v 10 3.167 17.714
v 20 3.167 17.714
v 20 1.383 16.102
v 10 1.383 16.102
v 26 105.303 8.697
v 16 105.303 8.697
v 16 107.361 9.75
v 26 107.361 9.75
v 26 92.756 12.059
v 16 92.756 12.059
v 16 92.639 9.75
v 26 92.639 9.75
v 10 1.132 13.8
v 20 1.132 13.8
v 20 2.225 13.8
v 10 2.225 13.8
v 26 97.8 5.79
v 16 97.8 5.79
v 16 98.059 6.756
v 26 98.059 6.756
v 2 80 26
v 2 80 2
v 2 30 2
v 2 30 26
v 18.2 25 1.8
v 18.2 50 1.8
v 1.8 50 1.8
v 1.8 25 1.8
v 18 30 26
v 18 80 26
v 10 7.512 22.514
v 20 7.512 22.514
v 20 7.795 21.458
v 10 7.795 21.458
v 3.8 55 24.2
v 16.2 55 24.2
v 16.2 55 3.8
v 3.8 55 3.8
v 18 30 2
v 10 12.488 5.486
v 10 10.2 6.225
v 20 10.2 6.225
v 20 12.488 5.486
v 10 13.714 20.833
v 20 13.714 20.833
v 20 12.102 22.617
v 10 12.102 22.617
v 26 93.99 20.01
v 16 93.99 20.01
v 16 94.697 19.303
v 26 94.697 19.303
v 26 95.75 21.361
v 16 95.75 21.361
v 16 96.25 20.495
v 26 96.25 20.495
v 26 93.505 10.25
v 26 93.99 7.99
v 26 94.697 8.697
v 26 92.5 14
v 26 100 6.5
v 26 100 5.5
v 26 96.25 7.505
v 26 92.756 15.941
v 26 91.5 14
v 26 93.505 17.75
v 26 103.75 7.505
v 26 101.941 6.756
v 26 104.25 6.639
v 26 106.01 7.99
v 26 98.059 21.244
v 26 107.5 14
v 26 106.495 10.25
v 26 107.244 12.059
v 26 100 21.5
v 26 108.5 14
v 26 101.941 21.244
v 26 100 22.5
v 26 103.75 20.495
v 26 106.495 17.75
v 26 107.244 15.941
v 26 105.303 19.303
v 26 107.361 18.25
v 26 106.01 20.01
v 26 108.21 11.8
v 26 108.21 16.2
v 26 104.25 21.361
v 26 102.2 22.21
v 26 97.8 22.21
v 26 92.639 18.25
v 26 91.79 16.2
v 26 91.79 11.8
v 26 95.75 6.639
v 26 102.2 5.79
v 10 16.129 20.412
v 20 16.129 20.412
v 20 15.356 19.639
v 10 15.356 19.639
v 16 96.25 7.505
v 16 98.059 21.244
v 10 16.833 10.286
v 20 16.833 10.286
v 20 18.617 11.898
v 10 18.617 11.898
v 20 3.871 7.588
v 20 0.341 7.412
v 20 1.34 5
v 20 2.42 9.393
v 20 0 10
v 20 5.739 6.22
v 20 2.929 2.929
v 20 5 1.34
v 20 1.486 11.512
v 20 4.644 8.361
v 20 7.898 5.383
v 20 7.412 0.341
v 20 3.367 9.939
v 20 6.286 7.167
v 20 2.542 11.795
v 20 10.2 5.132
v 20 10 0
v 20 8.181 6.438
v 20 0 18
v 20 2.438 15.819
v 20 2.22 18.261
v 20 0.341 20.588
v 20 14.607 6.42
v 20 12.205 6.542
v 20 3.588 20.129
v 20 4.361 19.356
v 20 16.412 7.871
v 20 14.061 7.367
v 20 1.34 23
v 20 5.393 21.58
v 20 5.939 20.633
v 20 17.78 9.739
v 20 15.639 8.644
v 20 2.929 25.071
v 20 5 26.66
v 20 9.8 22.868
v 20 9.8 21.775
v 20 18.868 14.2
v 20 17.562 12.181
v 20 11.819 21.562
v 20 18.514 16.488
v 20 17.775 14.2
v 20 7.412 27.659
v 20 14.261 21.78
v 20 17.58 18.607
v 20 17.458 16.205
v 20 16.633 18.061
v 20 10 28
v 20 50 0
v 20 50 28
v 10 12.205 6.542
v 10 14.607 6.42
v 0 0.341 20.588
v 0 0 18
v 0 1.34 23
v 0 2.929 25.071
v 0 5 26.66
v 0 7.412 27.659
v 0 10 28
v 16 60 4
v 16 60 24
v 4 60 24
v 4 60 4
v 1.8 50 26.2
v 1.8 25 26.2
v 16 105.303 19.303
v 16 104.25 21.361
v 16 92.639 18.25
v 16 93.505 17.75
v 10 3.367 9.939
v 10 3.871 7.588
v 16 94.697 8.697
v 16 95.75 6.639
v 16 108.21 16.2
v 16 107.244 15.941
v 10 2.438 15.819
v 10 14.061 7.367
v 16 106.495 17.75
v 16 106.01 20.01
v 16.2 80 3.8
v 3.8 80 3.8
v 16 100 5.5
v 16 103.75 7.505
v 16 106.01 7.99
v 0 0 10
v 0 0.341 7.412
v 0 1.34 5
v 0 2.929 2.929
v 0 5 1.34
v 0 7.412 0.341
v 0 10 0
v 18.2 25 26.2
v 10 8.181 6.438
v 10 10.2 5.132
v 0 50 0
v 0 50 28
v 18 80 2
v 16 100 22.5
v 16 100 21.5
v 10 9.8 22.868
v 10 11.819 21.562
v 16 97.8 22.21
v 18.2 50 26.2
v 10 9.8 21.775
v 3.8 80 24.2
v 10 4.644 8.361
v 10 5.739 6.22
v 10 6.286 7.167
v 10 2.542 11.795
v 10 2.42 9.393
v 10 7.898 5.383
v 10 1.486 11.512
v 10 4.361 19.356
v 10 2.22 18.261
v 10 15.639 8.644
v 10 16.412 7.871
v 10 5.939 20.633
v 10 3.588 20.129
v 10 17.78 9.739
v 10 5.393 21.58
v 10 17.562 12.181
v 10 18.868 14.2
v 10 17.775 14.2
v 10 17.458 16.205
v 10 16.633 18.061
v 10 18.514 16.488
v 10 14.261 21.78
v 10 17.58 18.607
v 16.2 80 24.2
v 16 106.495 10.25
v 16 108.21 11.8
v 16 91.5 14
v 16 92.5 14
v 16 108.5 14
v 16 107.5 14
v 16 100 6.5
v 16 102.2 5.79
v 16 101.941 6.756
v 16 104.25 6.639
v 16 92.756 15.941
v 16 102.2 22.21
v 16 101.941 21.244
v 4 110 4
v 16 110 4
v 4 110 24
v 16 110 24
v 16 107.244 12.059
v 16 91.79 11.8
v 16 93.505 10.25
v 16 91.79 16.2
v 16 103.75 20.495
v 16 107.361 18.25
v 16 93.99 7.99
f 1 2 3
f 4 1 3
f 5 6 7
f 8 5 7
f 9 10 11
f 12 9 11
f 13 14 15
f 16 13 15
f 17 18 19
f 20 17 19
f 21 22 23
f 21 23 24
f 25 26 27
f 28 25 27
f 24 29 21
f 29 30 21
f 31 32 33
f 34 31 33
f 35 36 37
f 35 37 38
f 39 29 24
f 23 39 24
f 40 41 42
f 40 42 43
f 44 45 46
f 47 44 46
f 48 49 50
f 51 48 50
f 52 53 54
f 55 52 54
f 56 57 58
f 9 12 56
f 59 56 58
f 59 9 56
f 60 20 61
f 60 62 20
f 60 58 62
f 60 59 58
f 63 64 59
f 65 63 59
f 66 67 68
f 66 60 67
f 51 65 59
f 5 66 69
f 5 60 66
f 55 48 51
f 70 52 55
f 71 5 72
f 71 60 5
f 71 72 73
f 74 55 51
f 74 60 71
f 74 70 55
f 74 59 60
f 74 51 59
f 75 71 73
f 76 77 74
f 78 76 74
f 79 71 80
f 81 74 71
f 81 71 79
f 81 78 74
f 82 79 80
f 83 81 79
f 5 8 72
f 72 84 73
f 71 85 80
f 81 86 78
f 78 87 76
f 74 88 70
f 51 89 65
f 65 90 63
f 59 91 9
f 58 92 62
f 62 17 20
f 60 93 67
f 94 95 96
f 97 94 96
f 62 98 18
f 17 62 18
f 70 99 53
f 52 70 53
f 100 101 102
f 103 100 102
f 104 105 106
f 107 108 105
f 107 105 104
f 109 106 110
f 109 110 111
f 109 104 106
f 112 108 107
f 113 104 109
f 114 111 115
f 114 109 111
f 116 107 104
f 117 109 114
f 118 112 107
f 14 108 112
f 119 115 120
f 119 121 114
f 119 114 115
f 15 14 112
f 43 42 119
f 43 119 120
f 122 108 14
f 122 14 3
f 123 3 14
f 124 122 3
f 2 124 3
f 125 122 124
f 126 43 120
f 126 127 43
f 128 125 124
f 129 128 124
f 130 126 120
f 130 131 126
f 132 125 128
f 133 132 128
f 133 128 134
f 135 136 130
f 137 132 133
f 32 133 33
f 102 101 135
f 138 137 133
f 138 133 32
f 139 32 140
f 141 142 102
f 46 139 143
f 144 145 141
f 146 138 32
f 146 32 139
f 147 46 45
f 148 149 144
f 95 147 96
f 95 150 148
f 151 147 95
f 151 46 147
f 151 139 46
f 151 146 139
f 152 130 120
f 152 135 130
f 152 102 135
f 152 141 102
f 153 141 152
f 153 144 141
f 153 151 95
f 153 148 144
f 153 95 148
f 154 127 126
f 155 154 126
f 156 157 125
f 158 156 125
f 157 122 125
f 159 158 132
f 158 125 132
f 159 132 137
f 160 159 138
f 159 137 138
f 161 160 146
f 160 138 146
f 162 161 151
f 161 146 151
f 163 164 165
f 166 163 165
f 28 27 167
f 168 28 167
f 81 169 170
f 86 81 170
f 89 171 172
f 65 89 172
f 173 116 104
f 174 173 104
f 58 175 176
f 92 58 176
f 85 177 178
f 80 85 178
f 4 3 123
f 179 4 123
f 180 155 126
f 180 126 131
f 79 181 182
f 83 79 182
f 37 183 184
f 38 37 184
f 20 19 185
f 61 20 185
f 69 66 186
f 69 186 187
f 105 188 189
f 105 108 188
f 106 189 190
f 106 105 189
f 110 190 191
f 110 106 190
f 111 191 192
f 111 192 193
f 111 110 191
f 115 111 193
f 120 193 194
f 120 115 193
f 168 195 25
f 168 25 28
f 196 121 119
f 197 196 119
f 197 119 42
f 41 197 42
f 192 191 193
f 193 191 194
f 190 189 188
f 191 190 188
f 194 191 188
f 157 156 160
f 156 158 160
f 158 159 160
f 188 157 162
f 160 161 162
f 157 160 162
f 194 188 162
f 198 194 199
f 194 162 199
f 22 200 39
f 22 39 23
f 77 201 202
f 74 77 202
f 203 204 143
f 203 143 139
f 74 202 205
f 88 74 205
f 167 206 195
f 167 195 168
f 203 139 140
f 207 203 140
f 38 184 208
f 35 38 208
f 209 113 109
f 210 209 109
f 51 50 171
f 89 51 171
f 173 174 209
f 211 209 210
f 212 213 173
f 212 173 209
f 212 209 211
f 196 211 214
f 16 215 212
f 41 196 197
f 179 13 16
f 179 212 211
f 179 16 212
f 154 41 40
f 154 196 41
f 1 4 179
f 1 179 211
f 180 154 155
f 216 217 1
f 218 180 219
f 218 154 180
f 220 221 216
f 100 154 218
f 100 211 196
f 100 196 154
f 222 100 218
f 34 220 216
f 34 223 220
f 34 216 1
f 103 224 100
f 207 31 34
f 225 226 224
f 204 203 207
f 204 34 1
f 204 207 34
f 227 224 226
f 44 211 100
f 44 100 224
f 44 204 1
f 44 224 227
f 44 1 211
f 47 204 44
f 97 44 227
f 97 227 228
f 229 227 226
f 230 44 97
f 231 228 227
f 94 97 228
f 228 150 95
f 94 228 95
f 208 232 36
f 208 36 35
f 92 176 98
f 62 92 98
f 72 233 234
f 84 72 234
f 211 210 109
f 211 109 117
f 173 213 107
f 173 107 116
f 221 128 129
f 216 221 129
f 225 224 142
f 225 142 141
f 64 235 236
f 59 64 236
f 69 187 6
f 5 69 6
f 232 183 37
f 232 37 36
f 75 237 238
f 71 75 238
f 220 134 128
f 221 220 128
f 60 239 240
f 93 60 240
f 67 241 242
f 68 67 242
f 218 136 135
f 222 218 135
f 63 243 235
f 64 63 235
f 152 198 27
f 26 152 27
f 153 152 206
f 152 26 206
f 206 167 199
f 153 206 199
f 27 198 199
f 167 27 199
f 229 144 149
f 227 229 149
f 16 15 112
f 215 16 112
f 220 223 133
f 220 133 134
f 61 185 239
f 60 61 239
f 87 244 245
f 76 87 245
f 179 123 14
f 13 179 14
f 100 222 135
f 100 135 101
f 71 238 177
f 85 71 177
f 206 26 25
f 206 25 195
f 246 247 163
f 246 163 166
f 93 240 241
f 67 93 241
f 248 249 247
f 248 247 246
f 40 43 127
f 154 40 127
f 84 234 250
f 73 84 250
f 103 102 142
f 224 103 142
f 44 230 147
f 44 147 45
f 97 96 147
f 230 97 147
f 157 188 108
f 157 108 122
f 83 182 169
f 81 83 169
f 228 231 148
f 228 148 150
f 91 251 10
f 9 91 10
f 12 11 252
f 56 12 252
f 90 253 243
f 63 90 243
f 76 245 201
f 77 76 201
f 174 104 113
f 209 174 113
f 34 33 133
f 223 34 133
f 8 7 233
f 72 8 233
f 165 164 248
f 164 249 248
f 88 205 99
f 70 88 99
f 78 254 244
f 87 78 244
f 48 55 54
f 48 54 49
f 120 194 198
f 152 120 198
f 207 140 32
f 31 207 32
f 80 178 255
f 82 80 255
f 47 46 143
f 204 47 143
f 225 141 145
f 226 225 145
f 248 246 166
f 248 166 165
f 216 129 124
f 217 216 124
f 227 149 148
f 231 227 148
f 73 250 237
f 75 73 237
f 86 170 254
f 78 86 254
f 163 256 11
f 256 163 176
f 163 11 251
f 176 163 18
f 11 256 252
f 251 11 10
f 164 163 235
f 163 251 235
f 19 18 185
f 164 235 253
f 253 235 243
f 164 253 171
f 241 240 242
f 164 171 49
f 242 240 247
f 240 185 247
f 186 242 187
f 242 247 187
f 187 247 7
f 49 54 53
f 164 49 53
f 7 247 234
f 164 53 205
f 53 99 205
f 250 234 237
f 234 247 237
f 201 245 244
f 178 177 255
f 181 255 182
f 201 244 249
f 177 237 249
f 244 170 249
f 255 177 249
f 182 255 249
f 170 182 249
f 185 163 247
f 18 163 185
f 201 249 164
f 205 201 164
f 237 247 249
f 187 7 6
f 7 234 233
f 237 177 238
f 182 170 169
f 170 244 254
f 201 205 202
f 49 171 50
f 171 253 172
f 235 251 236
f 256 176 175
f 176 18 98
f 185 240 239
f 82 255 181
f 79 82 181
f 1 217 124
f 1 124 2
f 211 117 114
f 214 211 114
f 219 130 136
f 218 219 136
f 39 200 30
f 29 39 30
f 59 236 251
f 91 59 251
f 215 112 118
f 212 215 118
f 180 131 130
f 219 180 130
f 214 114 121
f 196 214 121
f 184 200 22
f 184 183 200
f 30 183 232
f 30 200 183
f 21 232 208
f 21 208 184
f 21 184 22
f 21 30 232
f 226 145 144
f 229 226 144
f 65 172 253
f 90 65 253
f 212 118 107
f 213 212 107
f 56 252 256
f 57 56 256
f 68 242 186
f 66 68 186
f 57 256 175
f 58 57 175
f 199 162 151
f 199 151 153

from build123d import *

# Parameters (mm, degrees)
F0_W           = 50
F0_H           = 28
F1_DEPTH       = 20
F3_DEPTH       = 10
F4_R           = 10
F5_W           = 16.4
F5_H           = 24.4
F5_W_2         = 16
F5_H_2         = 24
F6_DEPTH       = 25
F7_DEPTH       = 30
F7_DEPTH_BACK  = 20
F8_W           = 12.4
F8_H           = 20.4
F8_W_2         = 12
F8_H_2         = 20
F9_DEPTH       = 25
F10_DEPTH      = 30
F10_DEPTH_BACK = 20
F12_DEPTH      = 10


with BuildPart() as f1:
    # F0 (on Right) → F1 (new body)
    with BuildSketch(Plane.YZ):
        with Locations((25, 14)):
            Rectangle(F0_W, F0_H)
    extrude(amount=F1_DEPTH)

    # F2 (on face) → F3 (cut)
    with BuildSketch(Plane.YZ.offset(20)):
        Polygon((17.774749168, 14.2000007122), (18.513635743, 16.4882777954), (17.4580670209, 16.2054390088), (17.5795269568, 18.6069828589), (16.6331299314, 18.0605802816), (16.1288859342, 20.411729654), (15.3561559988, 19.6389997186), (14.2605714638, 21.779527669), (13.7141688864, 20.8331306436), (12.101906089, 22.6171637297), (11.8190673023, 21.5615950076), (9.7999992878, 22.8675543227), (9.7999992878, 21.774749168), (7.5117222046, 22.513635743), (7.7945609912, 21.4580670209), (5.3930171411, 21.5795269568), (5.9394197184, 20.6331299314), (3.588270346, 20.1288859342), (4.3610002814, 19.3561559988), (2.220472331, 18.2605714638), (3.1668693564, 17.7141688864), (1.3828362703, 16.101906089), (2.4384049924, 15.8190673023), (1.1324456773, 13.7999992878), (2.225250832, 13.7999992878), (1.486364257, 11.5117222046), (2.5419329791, 11.7945609912), (2.4204730432, 9.3930171411), (3.3668700686, 9.9394197184), (3.8711140658, 7.588270346), (4.6438440012, 8.3610002814), (5.7394285362, 6.220472331), (6.2858311136, 7.1668693564), (7.898093911, 5.3828362703), (8.1809326977, 6.4384049924), (10.2000007122, 5.1324456773), (10.2000007122, 6.225250832), (12.4882777954, 5.486364257), (12.2054390088, 6.5419329791), (14.6069828589, 6.4204730432), (14.0605802816, 7.3668700686), (16.411729654, 7.8711140658), (15.6389997186, 8.6438440012), (17.779527669, 9.7394285362), (16.8331306436, 10.2858311136), (18.6171637297, 11.898093911), (17.5615950076, 12.1809326977), (18.8675543227, 14.2000007122), align=None)
        Polygon((18.2103695235, 16.1999618834), (17.5, 14), (18.5, 14), (17.2444436972, 12.0588571617), (18.2103695235, 11.8000381166), (16.4951905284, 10.25), (17.3612159322, 9.75), (15.3033008589, 8.6966991411), (16.0104076401, 7.9895923599), (13.75, 7.5048094716), (14.25, 6.6387840678), (11.9411428383, 6.7555563028), (12.1999618834, 5.7896304765), (10, 6.5), (10, 5.5), (8.0588571617, 6.7555563028), (7.8000381166, 5.7896304765), (6.25, 7.5048094716), (5.75, 6.6387840678), (4.6966991411, 8.6966991411), (3.9895923599, 7.9895923599), (3.5048094716, 10.25), (2.6387840678, 9.75), (2.7555563028, 12.0588571617), (1.7896304765, 11.8000381166), (2.5, 14), (1.5, 14), (2.7555563028, 15.9411428383), (1.7896304765, 16.1999618834), (3.5048094716, 17.75), (2.6387840678, 18.25), (4.6966991411, 19.3033008589), (3.9895923599, 20.0104076401), (6.25, 20.4951905284), (5.75, 21.3612159322), (8.0588571617, 21.2444436972), (7.8000381166, 22.2103695235), (10, 21.5), (10, 22.5), (11.9411428383, 21.2444436972), (12.1999618834, 22.2103695235), (13.75, 20.4951905284), (14.25, 21.3612159322), (15.3033008589, 19.3033008589), (16.0104076401, 20.0104076401), (16.4951905284, 17.75), (17.3612159322, 18.25), (17.2444436972, 15.9411428383), align=None, mode=Mode.SUBTRACT)
        with BuildLine():
            ThreePointArc((17.2444436972, 12.0588571617), (17.4358364603, 13.0210535583), (17.5, 14))
            ThreePointArc((17.5, 14), (17.4358364603, 14.9789464417), (17.2444436972, 15.9411428383))
            ThreePointArc((17.2444436972, 15.9411428383), (16.9290964938, 16.8701257427), (16.4951905284, 17.75))
            ThreePointArc((16.4951905284, 17.75), (15.9501500522, 18.5657107176), (15.3033008589, 19.3033008589))
            ThreePointArc((15.3033008589, 19.3033008589), (14.5657107176, 19.9501500522), (13.75, 20.4951905284))
            ThreePointArc((13.75, 20.4951905284), (12.8701257427, 20.9290964938), (11.9411428383, 21.2444436972))
            ThreePointArc((11.9411428383, 21.2444436972), (10.9789464417, 21.4358364603), (10, 21.5))
            ThreePointArc((10, 21.5), (9.0210535583, 21.4358364603), (8.0588571617, 21.2444436972))
            ThreePointArc((8.0588571617, 21.2444436972), (7.1298742573, 20.9290964938), (6.25, 20.4951905284))
            ThreePointArc((6.25, 20.4951905284), (5.4342892824, 19.9501500522), (4.6966991411, 19.3033008589))
            ThreePointArc((4.6966991411, 19.3033008589), (4.0498499478, 18.5657107176), (3.5048094716, 17.75))
            ThreePointArc((3.5048094716, 17.75), (3.0709035062, 16.8701257427), (2.7555563028, 15.9411428383))
            ThreePointArc((2.7555563028, 15.9411428383), (2.5641635397, 14.9789464417), (2.5, 14))
            ThreePointArc((2.5, 14), (2.5641635397, 13.0210535583), (2.7555563028, 12.0588571617))
            ThreePointArc((2.7555563028, 12.0588571617), (3.0709035062, 11.1298742573), (3.5048094716, 10.25))
            ThreePointArc((3.5048094716, 10.25), (4.0498499478, 9.4342892824), (4.6966991411, 8.6966991411))
            ThreePointArc((4.6966991411, 8.6966991411), (5.4342892824, 8.0498499478), (6.25, 7.5048094716))
            ThreePointArc((6.25, 7.5048094716), (7.1298742573, 7.0709035062), (8.0588571617, 6.7555563028))
            ThreePointArc((8.0588571617, 6.7555563028), (9.0210535583, 6.5641635397), (10, 6.5))
            ThreePointArc((10, 6.5), (10.9789464417, 6.5641635397), (11.9411428383, 6.7555563028))
            ThreePointArc((11.9411428383, 6.7555563028), (12.8701257427, 7.0709035062), (13.75, 7.5048094716))
            ThreePointArc((13.75, 7.5048094716), (14.5657107176, 8.0498499478), (15.3033008589, 8.6966991411))
            ThreePointArc((15.3033008589, 8.6966991411), (15.9501500522, 9.4342892824), (16.4951905284, 10.25))
            ThreePointArc((16.4951905284, 10.25), (16.9290964938, 11.1298742573), (17.2444436972, 12.0588571617))
        make_face()
        with BuildLine():
            ThreePointArc((8.0588571617, 21.2444436972), (9.0210535583, 21.4358364603), (10, 21.5))
            Line((10, 21.5), (7.8000381166, 22.2103695235))
            Line((7.8000381166, 22.2103695235), (8.0588571617, 21.2444436972))
        make_face()
        with BuildLine():
            ThreePointArc((6.25, 20.4951905284), (7.1298742573, 20.9290964938), (8.0588571617, 21.2444436972))
            Line((8.0588571617, 21.2444436972), (5.75, 21.3612159322))
            Line((5.75, 21.3612159322), (6.25, 20.4951905284))
        make_face()
        with BuildLine():
            ThreePointArc((4.6966991411, 19.3033008589), (5.4342892824, 19.9501500522), (6.25, 20.4951905284))
            Line((6.25, 20.4951905284), (3.9895923599, 20.0104076401))
            Line((3.9895923599, 20.0104076401), (4.6966991411, 19.3033008589))
        make_face()
        with BuildLine():
            ThreePointArc((3.5048094716, 17.75), (4.0498499478, 18.5657107176), (4.6966991411, 19.3033008589))
            Line((4.6966991411, 19.3033008589), (2.6387840678, 18.25))
            Line((2.6387840678, 18.25), (3.5048094716, 17.75))
        make_face()
        with BuildLine():
            ThreePointArc((2.7555563028, 15.9411428383), (3.0709035062, 16.8701257427), (3.5048094716, 17.75))
            Line((3.5048094716, 17.75), (1.7896304765, 16.1999618834))
            Line((1.7896304765, 16.1999618834), (2.7555563028, 15.9411428383))
        make_face()
        with BuildLine():
            Line((1.7896304765, 11.8000381166), (2.7555563028, 12.0588571617))
            ThreePointArc((2.7555563028, 12.0588571617), (2.5641635397, 13.0210535583), (2.5, 14))
            Line((2.5, 14), (1.7896304765, 11.8000381166))
        make_face()
        with BuildLine():
            ThreePointArc((2.5, 14), (2.5641635397, 14.9789464417), (2.7555563028, 15.9411428383))
            Line((2.7555563028, 15.9411428383), (1.5, 14))
            Line((1.5, 14), (2.5, 14))
        make_face()
        with BuildLine():
            Line((2.6387840678, 9.75), (3.5048094716, 10.25))
            ThreePointArc((3.5048094716, 10.25), (3.0709035062, 11.1298742573), (2.7555563028, 12.0588571617))
            Line((2.7555563028, 12.0588571617), (2.6387840678, 9.75))
        make_face()
        with BuildLine():
            ThreePointArc((10, 21.5), (10.9789464417, 21.4358364603), (11.9411428383, 21.2444436972))
            Line((11.9411428383, 21.2444436972), (10, 22.5))
            Line((10, 22.5), (10, 21.5))
        make_face()
        with BuildLine():
            ThreePointArc((11.9411428383, 21.2444436972), (12.8701257427, 20.9290964938), (13.75, 20.4951905284))
            Line((13.75, 20.4951905284), (12.1999618834, 22.2103695235))
            Line((12.1999618834, 22.2103695235), (11.9411428383, 21.2444436972))
        make_face()
        with BuildLine():
            ThreePointArc((13.75, 20.4951905284), (14.5657107176, 19.9501500522), (15.3033008589, 19.3033008589))
            Line((15.3033008589, 19.3033008589), (14.25, 21.3612159322))
            Line((14.25, 21.3612159322), (13.75, 20.4951905284))
        make_face()
        with BuildLine():
            ThreePointArc((15.3033008589, 19.3033008589), (15.9501500522, 18.5657107176), (16.4951905284, 17.75))
            Line((16.4951905284, 17.75), (16.0104076401, 20.0104076401))
            Line((16.0104076401, 20.0104076401), (15.3033008589, 19.3033008589))
        make_face()
        with BuildLine():
            ThreePointArc((16.4951905284, 17.75), (16.9290964938, 16.8701257427), (17.2444436972, 15.9411428383))
            Line((17.2444436972, 15.9411428383), (17.3612159322, 18.25))
            Line((17.3612159322, 18.25), (16.4951905284, 17.75))
        make_face()
        with BuildLine():
            ThreePointArc((17.2444436972, 15.9411428383), (17.4358364603, 14.9789464417), (17.5, 14))
            Line((17.5, 14), (18.2103695235, 16.1999618834))
            Line((18.2103695235, 16.1999618834), (17.2444436972, 15.9411428383))
        make_face()
        with BuildLine():
            Line((18.5, 14), (17.5, 14))
            ThreePointArc((17.5, 14), (17.4358364603, 13.0210535583), (17.2444436972, 12.0588571617))
            Line((17.2444436972, 12.0588571617), (18.5, 14))
        make_face()
        with BuildLine():
            Line((18.2103695235, 11.8000381166), (17.2444436972, 12.0588571617))
            ThreePointArc((17.2444436972, 12.0588571617), (16.9290964938, 11.1298742573), (16.4951905284, 10.25))
            Line((16.4951905284, 10.25), (18.2103695235, 11.8000381166))
        make_face()
        with BuildLine():
            Line((17.3612159322, 9.75), (16.4951905284, 10.25))
            ThreePointArc((16.4951905284, 10.25), (15.9501500522, 9.4342892824), (15.3033008589, 8.6966991411))
            Line((15.3033008589, 8.6966991411), (17.3612159322, 9.75))
        make_face()
        with BuildLine():
            Line((16.0104076401, 7.9895923599), (15.3033008589, 8.6966991411))
            ThreePointArc((15.3033008589, 8.6966991411), (14.5657107176, 8.0498499478), (13.75, 7.5048094716))
            Line((13.75, 7.5048094716), (16.0104076401, 7.9895923599))
        make_face()
        with BuildLine():
            Line((14.25, 6.6387840678), (13.75, 7.5048094716))
            ThreePointArc((13.75, 7.5048094716), (12.8701257427, 7.0709035062), (11.9411428383, 6.7555563028))
            Line((11.9411428383, 6.7555563028), (14.25, 6.6387840678))
        make_face()
        with BuildLine():
            Line((12.1999618834, 5.7896304765), (11.9411428383, 6.7555563028))
            ThreePointArc((11.9411428383, 6.7555563028), (10.9789464417, 6.5641635397), (10, 6.5))
            Line((10, 6.5), (12.1999618834, 5.7896304765))
        make_face()
        with BuildLine():
            Line((10, 5.5), (10, 6.5))
            ThreePointArc((10, 6.5), (9.0210535583, 6.5641635397), (8.0588571617, 6.7555563028))
            Line((8.0588571617, 6.7555563028), (10, 5.5))
        make_face()
        with BuildLine():
            Line((7.8000381166, 5.7896304765), (8.0588571617, 6.7555563028))
            ThreePointArc((8.0588571617, 6.7555563028), (7.1298742573, 7.0709035062), (6.25, 7.5048094716))
            Line((6.25, 7.5048094716), (7.8000381166, 5.7896304765))
        make_face()
        with BuildLine():
            Line((5.75, 6.6387840678), (6.25, 7.5048094716))
            ThreePointArc((6.25, 7.5048094716), (5.4342892824, 8.0498499478), (4.6966991411, 8.6966991411))
            Line((4.6966991411, 8.6966991411), (5.75, 6.6387840678))
        make_face()
        with BuildLine():
            Line((3.9895923599, 7.9895923599), (4.6966991411, 8.6966991411))
            ThreePointArc((4.6966991411, 8.6966991411), (4.0498499478, 9.4342892824), (3.5048094716, 10.25))
            Line((3.5048094716, 10.25), (3.9895923599, 7.9895923599))
        make_face()
    extrude(amount=-F3_DEPTH, mode=Mode.SUBTRACT)

    # F4
    f4_edges = [f1.edges().sort_by_distance(p)[0] for p in [
        (10, 0, 0),
        (10, 0, 28),
    ]]
    fillet(f4_edges, radius=F4_R)

    # F5 (on face) → F6 (cut)
    with BuildSketch(Plane(origin=(0, 50, 0), x_dir=(-1, 0, 0), z_dir=(0, 1, 0))):
        with Locations((-10, 14)):
            Rectangle(F5_W, F5_H)
        with Locations((-10, 14)):
            Rectangle(F5_W_2, F5_H_2, mode=Mode.SUBTRACT)
        with Locations((-10, 14)):
            Rectangle(F5_W_2, F5_H_2)
    extrude(amount=-F6_DEPTH, mode=Mode.SUBTRACT)


with BuildPart() as f7:
    # F5 (on face) → F7 (new body, two sides)
    with BuildSketch(Plane(origin=(0, 50, 0), x_dir=(-1, 0, 0), z_dir=(0, 1, 0))) as f7_sk:
        with Locations((-10, 14)):
            Rectangle(F5_W_2, F5_H_2)
    extrude(amount=F7_DEPTH)
    extrude(f7_sk.sketch, amount=-F7_DEPTH_BACK)

    # F8 (on face) → F9 (cut)
    with BuildSketch(Plane(origin=(0, 80, 0), x_dir=(-1, 0, 0), z_dir=(0, 1, 0))):
        with Locations((-10, 14)):
            Rectangle(F8_W, F8_H)
        with Locations((-10, 14)):
            Rectangle(F8_W_2, F8_H_2, mode=Mode.SUBTRACT)
        with Locations((-10, 14)):
            Rectangle(F8_W_2, F8_H_2)
    extrude(amount=-F9_DEPTH, mode=Mode.SUBTRACT)


with BuildPart() as f10:
    # F8 (on face) → F10 (new body, two sides)
    with BuildSketch(Plane(origin=(0, 80, 0), x_dir=(-1, 0, 0), z_dir=(0, 1, 0))) as f10_sk:
        with Locations((-10, 14)):
            Rectangle(F8_W_2, F8_H_2)
    extrude(amount=F10_DEPTH)
    extrude(f10_sk.sketch, amount=-F10_DEPTH_BACK)

    # F11 (on face) → F12 (join)
    with BuildSketch(Plane.YZ.offset(16)):
        with BuildLine():
            ThreePointArc((107.2444436972, 12.0588571617), (107.4358364603, 13.0210535583), (107.5, 14))
            ThreePointArc((107.5, 14), (107.4358364603, 14.9789464417), (107.2444436972, 15.9411428383))
            ThreePointArc((107.2444436972, 15.9411428383), (106.9290964938, 16.8701257427), (106.4951905284, 17.75))
            ThreePointArc((106.4951905284, 17.75), (105.9501500522, 18.5657107176), (105.3033008589, 19.3033008589))
            ThreePointArc((105.3033008589, 19.3033008589), (104.5657107176, 19.9501500522), (103.75, 20.4951905284))
            ThreePointArc((103.75, 20.4951905284), (102.8701257427, 20.9290964938), (101.9411428383, 21.2444436972))
            ThreePointArc((101.9411428383, 21.2444436972), (100.9789464417, 21.4358364603), (100, 21.5))
            ThreePointArc((100, 21.5), (99.0210535583, 21.4358364603), (98.0588571617, 21.2444436972))
            ThreePointArc((98.0588571617, 21.2444436972), (97.1298742573, 20.9290964938), (96.25, 20.4951905284))
            ThreePointArc((96.25, 20.4951905284), (95.4342892824, 19.9501500522), (94.6966991411, 19.3033008589))
            ThreePointArc((94.6966991411, 19.3033008589), (94.0498499478, 18.5657107176), (93.5048094716, 17.75))
            ThreePointArc((93.5048094716, 17.75), (93.0709035062, 16.8701257427), (92.7555563028, 15.9411428383))
            ThreePointArc((92.7555563028, 15.9411428383), (92.5641635397, 14.9789464417), (92.5, 14))
            ThreePointArc((92.5, 14), (92.5641635397, 13.0210535583), (92.7555563028, 12.0588571617))
            ThreePointArc((92.7555563028, 12.0588571617), (93.0709035062, 11.1298742573), (93.5048094716, 10.25))
            ThreePointArc((93.5048094716, 10.25), (94.0498499478, 9.4342892824), (94.6966991411, 8.6966991411))
            ThreePointArc((94.6966991411, 8.6966991411), (95.4342892824, 8.0498499478), (96.25, 7.5048094716))
            ThreePointArc((96.25, 7.5048094716), (97.1298742573, 7.0709035062), (98.0588571617, 6.7555563028))
            ThreePointArc((98.0588571617, 6.7555563028), (99.0210535583, 6.5641635397), (100, 6.5))
            ThreePointArc((100, 6.5), (100.9789464417, 6.5641635397), (101.9411428383, 6.7555563028))
            ThreePointArc((101.9411428383, 6.7555563028), (102.8701257427, 7.0709035062), (103.75, 7.5048094716))
            ThreePointArc((103.75, 7.5048094716), (104.5657107176, 8.0498499478), (105.3033008589, 8.6966991411))
            ThreePointArc((105.3033008589, 8.6966991411), (105.9501500522, 9.4342892824), (106.4951905284, 10.25))
            ThreePointArc((106.4951905284, 10.25), (106.9290964938, 11.1298742573), (107.2444436972, 12.0588571617))
        make_face()
        with BuildLine():
            Line((108.2103695235, 11.8000381166), (107.2444436972, 12.0588571617))
            ThreePointArc((107.2444436972, 12.0588571617), (106.9290964938, 11.1298742573), (106.4951905284, 10.25))
            Line((106.4951905284, 10.25), (108.2103695235, 11.8000381166))
        make_face()
        with BuildLine():
            Line((108.5, 14), (107.5, 14))
            ThreePointArc((107.5, 14), (107.4358364603, 13.0210535583), (107.2444436972, 12.0588571617))
            Line((107.2444436972, 12.0588571617), (108.5, 14))
        make_face()
        with BuildLine():
            ThreePointArc((107.2444436972, 15.9411428383), (107.4358364603, 14.9789464417), (107.5, 14))
            Line((107.5, 14), (108.2103695235, 16.1999618834))
            Line((108.2103695235, 16.1999618834), (107.2444436972, 15.9411428383))
        make_face()
        with BuildLine():
            ThreePointArc((106.4951905284, 17.75), (106.9290964938, 16.8701257427), (107.2444436972, 15.9411428383))
            Line((107.2444436972, 15.9411428383), (107.3612159322, 18.25))
            Line((107.3612159322, 18.25), (106.4951905284, 17.75))
        make_face()
        with BuildLine():
            ThreePointArc((105.3033008589, 19.3033008589), (105.9501500522, 18.5657107176), (106.4951905284, 17.75))
            Line((106.4951905284, 17.75), (106.0104076401, 20.0104076401))
            Line((106.0104076401, 20.0104076401), (105.3033008589, 19.3033008589))
        make_face()
        with BuildLine():
            ThreePointArc((103.75, 20.4951905284), (104.5657107176, 19.9501500522), (105.3033008589, 19.3033008589))
            Line((105.3033008589, 19.3033008589), (104.25, 21.3612159322))
            Line((104.25, 21.3612159322), (103.75, 20.4951905284))
        make_face()
        with BuildLine():
            ThreePointArc((101.9411428383, 21.2444436972), (102.8701257427, 20.9290964938), (103.75, 20.4951905284))
            Line((103.75, 20.4951905284), (102.1999618834, 22.2103695235))
            Line((102.1999618834, 22.2103695235), (101.9411428383, 21.2444436972))
        make_face()
        with BuildLine():
            ThreePointArc((100, 21.5), (100.9789464417, 21.4358364603), (101.9411428383, 21.2444436972))
            Line((101.9411428383, 21.2444436972), (100, 22.5))
            Line((100, 22.5), (100, 21.5))
        make_face()
        with BuildLine():
            ThreePointArc((98.0588571617, 21.2444436972), (99.0210535583, 21.4358364603), (100, 21.5))
            Line((100, 21.5), (97.8000381166, 22.2103695235))
            Line((97.8000381166, 22.2103695235), (98.0588571617, 21.2444436972))
        make_face()
        with BuildLine():
            ThreePointArc((96.25, 20.4951905284), (97.1298742573, 20.9290964938), (98.0588571617, 21.2444436972))
            Line((98.0588571617, 21.2444436972), (95.75, 21.3612159322))
            Line((95.75, 21.3612159322), (96.25, 20.4951905284))
        make_face()
        with BuildLine():
            ThreePointArc((94.6966991411, 19.3033008589), (95.4342892824, 19.9501500522), (96.25, 20.4951905284))
            Line((96.25, 20.4951905284), (93.9895923599, 20.0104076401))
            Line((93.9895923599, 20.0104076401), (94.6966991411, 19.3033008589))
        make_face()
        with BuildLine():
            ThreePointArc((93.5048094716, 17.75), (94.0498499478, 18.5657107176), (94.6966991411, 19.3033008589))
            Line((94.6966991411, 19.3033008589), (92.6387840678, 18.25))
            Line((92.6387840678, 18.25), (93.5048094716, 17.75))
        make_face()
        with BuildLine():
            ThreePointArc((92.7555563028, 15.9411428383), (93.0709035062, 16.8701257427), (93.5048094716, 17.75))
            Line((93.5048094716, 17.75), (91.7896304765, 16.1999618834))
            Line((91.7896304765, 16.1999618834), (92.7555563028, 15.9411428383))
        make_face()
        with BuildLine():
            ThreePointArc((92.5, 14), (92.5641635397, 14.9789464417), (92.7555563028, 15.9411428383))
            Line((92.7555563028, 15.9411428383), (91.5, 14))
            Line((91.5, 14), (92.5, 14))
        make_face()
        with BuildLine():
            Line((91.7896304765, 11.8000381166), (92.7555563028, 12.0588571617))
            ThreePointArc((92.7555563028, 12.0588571617), (92.5641635397, 13.0210535583), (92.5, 14))
            Line((92.5, 14), (91.7896304765, 11.8000381166))
        make_face()
        with BuildLine():
            Line((92.6387840678, 9.75), (93.5048094716, 10.25))
            ThreePointArc((93.5048094716, 10.25), (93.0709035062, 11.1298742573), (92.7555563028, 12.0588571617))
            Line((92.7555563028, 12.0588571617), (92.6387840678, 9.75))
        make_face()
        with BuildLine():
            Line((93.9895923599, 7.9895923599), (94.6966991411, 8.6966991411))
            ThreePointArc((94.6966991411, 8.6966991411), (94.0498499478, 9.4342892824), (93.5048094716, 10.25))
            Line((93.5048094716, 10.25), (93.9895923599, 7.9895923599))
        make_face()
        with BuildLine():
            Line((95.75, 6.6387840678), (96.25, 7.5048094716))
            ThreePointArc((96.25, 7.5048094716), (95.4342892824, 8.0498499478), (94.6966991411, 8.6966991411))
            Line((94.6966991411, 8.6966991411), (95.75, 6.6387840678))
        make_face()
        with BuildLine():
            Line((97.8000381166, 5.7896304765), (98.0588571617, 6.7555563028))
            ThreePointArc((98.0588571617, 6.7555563028), (97.1298742573, 7.0709035062), (96.25, 7.5048094716))
            Line((96.25, 7.5048094716), (97.8000381166, 5.7896304765))
        make_face()
        with BuildLine():
            Line((100, 5.5), (100, 6.5))
            ThreePointArc((100, 6.5), (99.0210535583, 6.5641635397), (98.0588571617, 6.7555563028))
            Line((98.0588571617, 6.7555563028), (100, 5.5))
        make_face()
        with BuildLine():
            Line((107.3612159322, 9.75), (106.4951905284, 10.25))
            ThreePointArc((106.4951905284, 10.25), (105.9501500522, 9.4342892824), (105.3033008589, 8.6966991411))
            Line((105.3033008589, 8.6966991411), (107.3612159322, 9.75))
        make_face()
        with BuildLine():
            Line((106.0104076401, 7.9895923599), (105.3033008589, 8.6966991411))
            ThreePointArc((105.3033008589, 8.6966991411), (104.5657107176, 8.0498499478), (103.75, 7.5048094716))
            Line((103.75, 7.5048094716), (106.0104076401, 7.9895923599))
        make_face()
        with BuildLine():
            Line((104.25, 6.6387840678), (103.75, 7.5048094716))
            ThreePointArc((103.75, 7.5048094716), (102.8701257427, 7.0709035062), (101.9411428383, 6.7555563028))
            Line((101.9411428383, 6.7555563028), (104.25, 6.6387840678))
        make_face()
        with BuildLine():
            Line((102.1999618834, 5.7896304765), (101.9411428383, 6.7555563028))
            ThreePointArc((101.9411428383, 6.7555563028), (100.9789464417, 6.5641635397), (100, 6.5))
            Line((100, 6.5), (102.1999618834, 5.7896304765))
        make_face()
    extrude(amount=F12_DEPTH)


solid = Compound([f1.part, f7.part, f10.part])
